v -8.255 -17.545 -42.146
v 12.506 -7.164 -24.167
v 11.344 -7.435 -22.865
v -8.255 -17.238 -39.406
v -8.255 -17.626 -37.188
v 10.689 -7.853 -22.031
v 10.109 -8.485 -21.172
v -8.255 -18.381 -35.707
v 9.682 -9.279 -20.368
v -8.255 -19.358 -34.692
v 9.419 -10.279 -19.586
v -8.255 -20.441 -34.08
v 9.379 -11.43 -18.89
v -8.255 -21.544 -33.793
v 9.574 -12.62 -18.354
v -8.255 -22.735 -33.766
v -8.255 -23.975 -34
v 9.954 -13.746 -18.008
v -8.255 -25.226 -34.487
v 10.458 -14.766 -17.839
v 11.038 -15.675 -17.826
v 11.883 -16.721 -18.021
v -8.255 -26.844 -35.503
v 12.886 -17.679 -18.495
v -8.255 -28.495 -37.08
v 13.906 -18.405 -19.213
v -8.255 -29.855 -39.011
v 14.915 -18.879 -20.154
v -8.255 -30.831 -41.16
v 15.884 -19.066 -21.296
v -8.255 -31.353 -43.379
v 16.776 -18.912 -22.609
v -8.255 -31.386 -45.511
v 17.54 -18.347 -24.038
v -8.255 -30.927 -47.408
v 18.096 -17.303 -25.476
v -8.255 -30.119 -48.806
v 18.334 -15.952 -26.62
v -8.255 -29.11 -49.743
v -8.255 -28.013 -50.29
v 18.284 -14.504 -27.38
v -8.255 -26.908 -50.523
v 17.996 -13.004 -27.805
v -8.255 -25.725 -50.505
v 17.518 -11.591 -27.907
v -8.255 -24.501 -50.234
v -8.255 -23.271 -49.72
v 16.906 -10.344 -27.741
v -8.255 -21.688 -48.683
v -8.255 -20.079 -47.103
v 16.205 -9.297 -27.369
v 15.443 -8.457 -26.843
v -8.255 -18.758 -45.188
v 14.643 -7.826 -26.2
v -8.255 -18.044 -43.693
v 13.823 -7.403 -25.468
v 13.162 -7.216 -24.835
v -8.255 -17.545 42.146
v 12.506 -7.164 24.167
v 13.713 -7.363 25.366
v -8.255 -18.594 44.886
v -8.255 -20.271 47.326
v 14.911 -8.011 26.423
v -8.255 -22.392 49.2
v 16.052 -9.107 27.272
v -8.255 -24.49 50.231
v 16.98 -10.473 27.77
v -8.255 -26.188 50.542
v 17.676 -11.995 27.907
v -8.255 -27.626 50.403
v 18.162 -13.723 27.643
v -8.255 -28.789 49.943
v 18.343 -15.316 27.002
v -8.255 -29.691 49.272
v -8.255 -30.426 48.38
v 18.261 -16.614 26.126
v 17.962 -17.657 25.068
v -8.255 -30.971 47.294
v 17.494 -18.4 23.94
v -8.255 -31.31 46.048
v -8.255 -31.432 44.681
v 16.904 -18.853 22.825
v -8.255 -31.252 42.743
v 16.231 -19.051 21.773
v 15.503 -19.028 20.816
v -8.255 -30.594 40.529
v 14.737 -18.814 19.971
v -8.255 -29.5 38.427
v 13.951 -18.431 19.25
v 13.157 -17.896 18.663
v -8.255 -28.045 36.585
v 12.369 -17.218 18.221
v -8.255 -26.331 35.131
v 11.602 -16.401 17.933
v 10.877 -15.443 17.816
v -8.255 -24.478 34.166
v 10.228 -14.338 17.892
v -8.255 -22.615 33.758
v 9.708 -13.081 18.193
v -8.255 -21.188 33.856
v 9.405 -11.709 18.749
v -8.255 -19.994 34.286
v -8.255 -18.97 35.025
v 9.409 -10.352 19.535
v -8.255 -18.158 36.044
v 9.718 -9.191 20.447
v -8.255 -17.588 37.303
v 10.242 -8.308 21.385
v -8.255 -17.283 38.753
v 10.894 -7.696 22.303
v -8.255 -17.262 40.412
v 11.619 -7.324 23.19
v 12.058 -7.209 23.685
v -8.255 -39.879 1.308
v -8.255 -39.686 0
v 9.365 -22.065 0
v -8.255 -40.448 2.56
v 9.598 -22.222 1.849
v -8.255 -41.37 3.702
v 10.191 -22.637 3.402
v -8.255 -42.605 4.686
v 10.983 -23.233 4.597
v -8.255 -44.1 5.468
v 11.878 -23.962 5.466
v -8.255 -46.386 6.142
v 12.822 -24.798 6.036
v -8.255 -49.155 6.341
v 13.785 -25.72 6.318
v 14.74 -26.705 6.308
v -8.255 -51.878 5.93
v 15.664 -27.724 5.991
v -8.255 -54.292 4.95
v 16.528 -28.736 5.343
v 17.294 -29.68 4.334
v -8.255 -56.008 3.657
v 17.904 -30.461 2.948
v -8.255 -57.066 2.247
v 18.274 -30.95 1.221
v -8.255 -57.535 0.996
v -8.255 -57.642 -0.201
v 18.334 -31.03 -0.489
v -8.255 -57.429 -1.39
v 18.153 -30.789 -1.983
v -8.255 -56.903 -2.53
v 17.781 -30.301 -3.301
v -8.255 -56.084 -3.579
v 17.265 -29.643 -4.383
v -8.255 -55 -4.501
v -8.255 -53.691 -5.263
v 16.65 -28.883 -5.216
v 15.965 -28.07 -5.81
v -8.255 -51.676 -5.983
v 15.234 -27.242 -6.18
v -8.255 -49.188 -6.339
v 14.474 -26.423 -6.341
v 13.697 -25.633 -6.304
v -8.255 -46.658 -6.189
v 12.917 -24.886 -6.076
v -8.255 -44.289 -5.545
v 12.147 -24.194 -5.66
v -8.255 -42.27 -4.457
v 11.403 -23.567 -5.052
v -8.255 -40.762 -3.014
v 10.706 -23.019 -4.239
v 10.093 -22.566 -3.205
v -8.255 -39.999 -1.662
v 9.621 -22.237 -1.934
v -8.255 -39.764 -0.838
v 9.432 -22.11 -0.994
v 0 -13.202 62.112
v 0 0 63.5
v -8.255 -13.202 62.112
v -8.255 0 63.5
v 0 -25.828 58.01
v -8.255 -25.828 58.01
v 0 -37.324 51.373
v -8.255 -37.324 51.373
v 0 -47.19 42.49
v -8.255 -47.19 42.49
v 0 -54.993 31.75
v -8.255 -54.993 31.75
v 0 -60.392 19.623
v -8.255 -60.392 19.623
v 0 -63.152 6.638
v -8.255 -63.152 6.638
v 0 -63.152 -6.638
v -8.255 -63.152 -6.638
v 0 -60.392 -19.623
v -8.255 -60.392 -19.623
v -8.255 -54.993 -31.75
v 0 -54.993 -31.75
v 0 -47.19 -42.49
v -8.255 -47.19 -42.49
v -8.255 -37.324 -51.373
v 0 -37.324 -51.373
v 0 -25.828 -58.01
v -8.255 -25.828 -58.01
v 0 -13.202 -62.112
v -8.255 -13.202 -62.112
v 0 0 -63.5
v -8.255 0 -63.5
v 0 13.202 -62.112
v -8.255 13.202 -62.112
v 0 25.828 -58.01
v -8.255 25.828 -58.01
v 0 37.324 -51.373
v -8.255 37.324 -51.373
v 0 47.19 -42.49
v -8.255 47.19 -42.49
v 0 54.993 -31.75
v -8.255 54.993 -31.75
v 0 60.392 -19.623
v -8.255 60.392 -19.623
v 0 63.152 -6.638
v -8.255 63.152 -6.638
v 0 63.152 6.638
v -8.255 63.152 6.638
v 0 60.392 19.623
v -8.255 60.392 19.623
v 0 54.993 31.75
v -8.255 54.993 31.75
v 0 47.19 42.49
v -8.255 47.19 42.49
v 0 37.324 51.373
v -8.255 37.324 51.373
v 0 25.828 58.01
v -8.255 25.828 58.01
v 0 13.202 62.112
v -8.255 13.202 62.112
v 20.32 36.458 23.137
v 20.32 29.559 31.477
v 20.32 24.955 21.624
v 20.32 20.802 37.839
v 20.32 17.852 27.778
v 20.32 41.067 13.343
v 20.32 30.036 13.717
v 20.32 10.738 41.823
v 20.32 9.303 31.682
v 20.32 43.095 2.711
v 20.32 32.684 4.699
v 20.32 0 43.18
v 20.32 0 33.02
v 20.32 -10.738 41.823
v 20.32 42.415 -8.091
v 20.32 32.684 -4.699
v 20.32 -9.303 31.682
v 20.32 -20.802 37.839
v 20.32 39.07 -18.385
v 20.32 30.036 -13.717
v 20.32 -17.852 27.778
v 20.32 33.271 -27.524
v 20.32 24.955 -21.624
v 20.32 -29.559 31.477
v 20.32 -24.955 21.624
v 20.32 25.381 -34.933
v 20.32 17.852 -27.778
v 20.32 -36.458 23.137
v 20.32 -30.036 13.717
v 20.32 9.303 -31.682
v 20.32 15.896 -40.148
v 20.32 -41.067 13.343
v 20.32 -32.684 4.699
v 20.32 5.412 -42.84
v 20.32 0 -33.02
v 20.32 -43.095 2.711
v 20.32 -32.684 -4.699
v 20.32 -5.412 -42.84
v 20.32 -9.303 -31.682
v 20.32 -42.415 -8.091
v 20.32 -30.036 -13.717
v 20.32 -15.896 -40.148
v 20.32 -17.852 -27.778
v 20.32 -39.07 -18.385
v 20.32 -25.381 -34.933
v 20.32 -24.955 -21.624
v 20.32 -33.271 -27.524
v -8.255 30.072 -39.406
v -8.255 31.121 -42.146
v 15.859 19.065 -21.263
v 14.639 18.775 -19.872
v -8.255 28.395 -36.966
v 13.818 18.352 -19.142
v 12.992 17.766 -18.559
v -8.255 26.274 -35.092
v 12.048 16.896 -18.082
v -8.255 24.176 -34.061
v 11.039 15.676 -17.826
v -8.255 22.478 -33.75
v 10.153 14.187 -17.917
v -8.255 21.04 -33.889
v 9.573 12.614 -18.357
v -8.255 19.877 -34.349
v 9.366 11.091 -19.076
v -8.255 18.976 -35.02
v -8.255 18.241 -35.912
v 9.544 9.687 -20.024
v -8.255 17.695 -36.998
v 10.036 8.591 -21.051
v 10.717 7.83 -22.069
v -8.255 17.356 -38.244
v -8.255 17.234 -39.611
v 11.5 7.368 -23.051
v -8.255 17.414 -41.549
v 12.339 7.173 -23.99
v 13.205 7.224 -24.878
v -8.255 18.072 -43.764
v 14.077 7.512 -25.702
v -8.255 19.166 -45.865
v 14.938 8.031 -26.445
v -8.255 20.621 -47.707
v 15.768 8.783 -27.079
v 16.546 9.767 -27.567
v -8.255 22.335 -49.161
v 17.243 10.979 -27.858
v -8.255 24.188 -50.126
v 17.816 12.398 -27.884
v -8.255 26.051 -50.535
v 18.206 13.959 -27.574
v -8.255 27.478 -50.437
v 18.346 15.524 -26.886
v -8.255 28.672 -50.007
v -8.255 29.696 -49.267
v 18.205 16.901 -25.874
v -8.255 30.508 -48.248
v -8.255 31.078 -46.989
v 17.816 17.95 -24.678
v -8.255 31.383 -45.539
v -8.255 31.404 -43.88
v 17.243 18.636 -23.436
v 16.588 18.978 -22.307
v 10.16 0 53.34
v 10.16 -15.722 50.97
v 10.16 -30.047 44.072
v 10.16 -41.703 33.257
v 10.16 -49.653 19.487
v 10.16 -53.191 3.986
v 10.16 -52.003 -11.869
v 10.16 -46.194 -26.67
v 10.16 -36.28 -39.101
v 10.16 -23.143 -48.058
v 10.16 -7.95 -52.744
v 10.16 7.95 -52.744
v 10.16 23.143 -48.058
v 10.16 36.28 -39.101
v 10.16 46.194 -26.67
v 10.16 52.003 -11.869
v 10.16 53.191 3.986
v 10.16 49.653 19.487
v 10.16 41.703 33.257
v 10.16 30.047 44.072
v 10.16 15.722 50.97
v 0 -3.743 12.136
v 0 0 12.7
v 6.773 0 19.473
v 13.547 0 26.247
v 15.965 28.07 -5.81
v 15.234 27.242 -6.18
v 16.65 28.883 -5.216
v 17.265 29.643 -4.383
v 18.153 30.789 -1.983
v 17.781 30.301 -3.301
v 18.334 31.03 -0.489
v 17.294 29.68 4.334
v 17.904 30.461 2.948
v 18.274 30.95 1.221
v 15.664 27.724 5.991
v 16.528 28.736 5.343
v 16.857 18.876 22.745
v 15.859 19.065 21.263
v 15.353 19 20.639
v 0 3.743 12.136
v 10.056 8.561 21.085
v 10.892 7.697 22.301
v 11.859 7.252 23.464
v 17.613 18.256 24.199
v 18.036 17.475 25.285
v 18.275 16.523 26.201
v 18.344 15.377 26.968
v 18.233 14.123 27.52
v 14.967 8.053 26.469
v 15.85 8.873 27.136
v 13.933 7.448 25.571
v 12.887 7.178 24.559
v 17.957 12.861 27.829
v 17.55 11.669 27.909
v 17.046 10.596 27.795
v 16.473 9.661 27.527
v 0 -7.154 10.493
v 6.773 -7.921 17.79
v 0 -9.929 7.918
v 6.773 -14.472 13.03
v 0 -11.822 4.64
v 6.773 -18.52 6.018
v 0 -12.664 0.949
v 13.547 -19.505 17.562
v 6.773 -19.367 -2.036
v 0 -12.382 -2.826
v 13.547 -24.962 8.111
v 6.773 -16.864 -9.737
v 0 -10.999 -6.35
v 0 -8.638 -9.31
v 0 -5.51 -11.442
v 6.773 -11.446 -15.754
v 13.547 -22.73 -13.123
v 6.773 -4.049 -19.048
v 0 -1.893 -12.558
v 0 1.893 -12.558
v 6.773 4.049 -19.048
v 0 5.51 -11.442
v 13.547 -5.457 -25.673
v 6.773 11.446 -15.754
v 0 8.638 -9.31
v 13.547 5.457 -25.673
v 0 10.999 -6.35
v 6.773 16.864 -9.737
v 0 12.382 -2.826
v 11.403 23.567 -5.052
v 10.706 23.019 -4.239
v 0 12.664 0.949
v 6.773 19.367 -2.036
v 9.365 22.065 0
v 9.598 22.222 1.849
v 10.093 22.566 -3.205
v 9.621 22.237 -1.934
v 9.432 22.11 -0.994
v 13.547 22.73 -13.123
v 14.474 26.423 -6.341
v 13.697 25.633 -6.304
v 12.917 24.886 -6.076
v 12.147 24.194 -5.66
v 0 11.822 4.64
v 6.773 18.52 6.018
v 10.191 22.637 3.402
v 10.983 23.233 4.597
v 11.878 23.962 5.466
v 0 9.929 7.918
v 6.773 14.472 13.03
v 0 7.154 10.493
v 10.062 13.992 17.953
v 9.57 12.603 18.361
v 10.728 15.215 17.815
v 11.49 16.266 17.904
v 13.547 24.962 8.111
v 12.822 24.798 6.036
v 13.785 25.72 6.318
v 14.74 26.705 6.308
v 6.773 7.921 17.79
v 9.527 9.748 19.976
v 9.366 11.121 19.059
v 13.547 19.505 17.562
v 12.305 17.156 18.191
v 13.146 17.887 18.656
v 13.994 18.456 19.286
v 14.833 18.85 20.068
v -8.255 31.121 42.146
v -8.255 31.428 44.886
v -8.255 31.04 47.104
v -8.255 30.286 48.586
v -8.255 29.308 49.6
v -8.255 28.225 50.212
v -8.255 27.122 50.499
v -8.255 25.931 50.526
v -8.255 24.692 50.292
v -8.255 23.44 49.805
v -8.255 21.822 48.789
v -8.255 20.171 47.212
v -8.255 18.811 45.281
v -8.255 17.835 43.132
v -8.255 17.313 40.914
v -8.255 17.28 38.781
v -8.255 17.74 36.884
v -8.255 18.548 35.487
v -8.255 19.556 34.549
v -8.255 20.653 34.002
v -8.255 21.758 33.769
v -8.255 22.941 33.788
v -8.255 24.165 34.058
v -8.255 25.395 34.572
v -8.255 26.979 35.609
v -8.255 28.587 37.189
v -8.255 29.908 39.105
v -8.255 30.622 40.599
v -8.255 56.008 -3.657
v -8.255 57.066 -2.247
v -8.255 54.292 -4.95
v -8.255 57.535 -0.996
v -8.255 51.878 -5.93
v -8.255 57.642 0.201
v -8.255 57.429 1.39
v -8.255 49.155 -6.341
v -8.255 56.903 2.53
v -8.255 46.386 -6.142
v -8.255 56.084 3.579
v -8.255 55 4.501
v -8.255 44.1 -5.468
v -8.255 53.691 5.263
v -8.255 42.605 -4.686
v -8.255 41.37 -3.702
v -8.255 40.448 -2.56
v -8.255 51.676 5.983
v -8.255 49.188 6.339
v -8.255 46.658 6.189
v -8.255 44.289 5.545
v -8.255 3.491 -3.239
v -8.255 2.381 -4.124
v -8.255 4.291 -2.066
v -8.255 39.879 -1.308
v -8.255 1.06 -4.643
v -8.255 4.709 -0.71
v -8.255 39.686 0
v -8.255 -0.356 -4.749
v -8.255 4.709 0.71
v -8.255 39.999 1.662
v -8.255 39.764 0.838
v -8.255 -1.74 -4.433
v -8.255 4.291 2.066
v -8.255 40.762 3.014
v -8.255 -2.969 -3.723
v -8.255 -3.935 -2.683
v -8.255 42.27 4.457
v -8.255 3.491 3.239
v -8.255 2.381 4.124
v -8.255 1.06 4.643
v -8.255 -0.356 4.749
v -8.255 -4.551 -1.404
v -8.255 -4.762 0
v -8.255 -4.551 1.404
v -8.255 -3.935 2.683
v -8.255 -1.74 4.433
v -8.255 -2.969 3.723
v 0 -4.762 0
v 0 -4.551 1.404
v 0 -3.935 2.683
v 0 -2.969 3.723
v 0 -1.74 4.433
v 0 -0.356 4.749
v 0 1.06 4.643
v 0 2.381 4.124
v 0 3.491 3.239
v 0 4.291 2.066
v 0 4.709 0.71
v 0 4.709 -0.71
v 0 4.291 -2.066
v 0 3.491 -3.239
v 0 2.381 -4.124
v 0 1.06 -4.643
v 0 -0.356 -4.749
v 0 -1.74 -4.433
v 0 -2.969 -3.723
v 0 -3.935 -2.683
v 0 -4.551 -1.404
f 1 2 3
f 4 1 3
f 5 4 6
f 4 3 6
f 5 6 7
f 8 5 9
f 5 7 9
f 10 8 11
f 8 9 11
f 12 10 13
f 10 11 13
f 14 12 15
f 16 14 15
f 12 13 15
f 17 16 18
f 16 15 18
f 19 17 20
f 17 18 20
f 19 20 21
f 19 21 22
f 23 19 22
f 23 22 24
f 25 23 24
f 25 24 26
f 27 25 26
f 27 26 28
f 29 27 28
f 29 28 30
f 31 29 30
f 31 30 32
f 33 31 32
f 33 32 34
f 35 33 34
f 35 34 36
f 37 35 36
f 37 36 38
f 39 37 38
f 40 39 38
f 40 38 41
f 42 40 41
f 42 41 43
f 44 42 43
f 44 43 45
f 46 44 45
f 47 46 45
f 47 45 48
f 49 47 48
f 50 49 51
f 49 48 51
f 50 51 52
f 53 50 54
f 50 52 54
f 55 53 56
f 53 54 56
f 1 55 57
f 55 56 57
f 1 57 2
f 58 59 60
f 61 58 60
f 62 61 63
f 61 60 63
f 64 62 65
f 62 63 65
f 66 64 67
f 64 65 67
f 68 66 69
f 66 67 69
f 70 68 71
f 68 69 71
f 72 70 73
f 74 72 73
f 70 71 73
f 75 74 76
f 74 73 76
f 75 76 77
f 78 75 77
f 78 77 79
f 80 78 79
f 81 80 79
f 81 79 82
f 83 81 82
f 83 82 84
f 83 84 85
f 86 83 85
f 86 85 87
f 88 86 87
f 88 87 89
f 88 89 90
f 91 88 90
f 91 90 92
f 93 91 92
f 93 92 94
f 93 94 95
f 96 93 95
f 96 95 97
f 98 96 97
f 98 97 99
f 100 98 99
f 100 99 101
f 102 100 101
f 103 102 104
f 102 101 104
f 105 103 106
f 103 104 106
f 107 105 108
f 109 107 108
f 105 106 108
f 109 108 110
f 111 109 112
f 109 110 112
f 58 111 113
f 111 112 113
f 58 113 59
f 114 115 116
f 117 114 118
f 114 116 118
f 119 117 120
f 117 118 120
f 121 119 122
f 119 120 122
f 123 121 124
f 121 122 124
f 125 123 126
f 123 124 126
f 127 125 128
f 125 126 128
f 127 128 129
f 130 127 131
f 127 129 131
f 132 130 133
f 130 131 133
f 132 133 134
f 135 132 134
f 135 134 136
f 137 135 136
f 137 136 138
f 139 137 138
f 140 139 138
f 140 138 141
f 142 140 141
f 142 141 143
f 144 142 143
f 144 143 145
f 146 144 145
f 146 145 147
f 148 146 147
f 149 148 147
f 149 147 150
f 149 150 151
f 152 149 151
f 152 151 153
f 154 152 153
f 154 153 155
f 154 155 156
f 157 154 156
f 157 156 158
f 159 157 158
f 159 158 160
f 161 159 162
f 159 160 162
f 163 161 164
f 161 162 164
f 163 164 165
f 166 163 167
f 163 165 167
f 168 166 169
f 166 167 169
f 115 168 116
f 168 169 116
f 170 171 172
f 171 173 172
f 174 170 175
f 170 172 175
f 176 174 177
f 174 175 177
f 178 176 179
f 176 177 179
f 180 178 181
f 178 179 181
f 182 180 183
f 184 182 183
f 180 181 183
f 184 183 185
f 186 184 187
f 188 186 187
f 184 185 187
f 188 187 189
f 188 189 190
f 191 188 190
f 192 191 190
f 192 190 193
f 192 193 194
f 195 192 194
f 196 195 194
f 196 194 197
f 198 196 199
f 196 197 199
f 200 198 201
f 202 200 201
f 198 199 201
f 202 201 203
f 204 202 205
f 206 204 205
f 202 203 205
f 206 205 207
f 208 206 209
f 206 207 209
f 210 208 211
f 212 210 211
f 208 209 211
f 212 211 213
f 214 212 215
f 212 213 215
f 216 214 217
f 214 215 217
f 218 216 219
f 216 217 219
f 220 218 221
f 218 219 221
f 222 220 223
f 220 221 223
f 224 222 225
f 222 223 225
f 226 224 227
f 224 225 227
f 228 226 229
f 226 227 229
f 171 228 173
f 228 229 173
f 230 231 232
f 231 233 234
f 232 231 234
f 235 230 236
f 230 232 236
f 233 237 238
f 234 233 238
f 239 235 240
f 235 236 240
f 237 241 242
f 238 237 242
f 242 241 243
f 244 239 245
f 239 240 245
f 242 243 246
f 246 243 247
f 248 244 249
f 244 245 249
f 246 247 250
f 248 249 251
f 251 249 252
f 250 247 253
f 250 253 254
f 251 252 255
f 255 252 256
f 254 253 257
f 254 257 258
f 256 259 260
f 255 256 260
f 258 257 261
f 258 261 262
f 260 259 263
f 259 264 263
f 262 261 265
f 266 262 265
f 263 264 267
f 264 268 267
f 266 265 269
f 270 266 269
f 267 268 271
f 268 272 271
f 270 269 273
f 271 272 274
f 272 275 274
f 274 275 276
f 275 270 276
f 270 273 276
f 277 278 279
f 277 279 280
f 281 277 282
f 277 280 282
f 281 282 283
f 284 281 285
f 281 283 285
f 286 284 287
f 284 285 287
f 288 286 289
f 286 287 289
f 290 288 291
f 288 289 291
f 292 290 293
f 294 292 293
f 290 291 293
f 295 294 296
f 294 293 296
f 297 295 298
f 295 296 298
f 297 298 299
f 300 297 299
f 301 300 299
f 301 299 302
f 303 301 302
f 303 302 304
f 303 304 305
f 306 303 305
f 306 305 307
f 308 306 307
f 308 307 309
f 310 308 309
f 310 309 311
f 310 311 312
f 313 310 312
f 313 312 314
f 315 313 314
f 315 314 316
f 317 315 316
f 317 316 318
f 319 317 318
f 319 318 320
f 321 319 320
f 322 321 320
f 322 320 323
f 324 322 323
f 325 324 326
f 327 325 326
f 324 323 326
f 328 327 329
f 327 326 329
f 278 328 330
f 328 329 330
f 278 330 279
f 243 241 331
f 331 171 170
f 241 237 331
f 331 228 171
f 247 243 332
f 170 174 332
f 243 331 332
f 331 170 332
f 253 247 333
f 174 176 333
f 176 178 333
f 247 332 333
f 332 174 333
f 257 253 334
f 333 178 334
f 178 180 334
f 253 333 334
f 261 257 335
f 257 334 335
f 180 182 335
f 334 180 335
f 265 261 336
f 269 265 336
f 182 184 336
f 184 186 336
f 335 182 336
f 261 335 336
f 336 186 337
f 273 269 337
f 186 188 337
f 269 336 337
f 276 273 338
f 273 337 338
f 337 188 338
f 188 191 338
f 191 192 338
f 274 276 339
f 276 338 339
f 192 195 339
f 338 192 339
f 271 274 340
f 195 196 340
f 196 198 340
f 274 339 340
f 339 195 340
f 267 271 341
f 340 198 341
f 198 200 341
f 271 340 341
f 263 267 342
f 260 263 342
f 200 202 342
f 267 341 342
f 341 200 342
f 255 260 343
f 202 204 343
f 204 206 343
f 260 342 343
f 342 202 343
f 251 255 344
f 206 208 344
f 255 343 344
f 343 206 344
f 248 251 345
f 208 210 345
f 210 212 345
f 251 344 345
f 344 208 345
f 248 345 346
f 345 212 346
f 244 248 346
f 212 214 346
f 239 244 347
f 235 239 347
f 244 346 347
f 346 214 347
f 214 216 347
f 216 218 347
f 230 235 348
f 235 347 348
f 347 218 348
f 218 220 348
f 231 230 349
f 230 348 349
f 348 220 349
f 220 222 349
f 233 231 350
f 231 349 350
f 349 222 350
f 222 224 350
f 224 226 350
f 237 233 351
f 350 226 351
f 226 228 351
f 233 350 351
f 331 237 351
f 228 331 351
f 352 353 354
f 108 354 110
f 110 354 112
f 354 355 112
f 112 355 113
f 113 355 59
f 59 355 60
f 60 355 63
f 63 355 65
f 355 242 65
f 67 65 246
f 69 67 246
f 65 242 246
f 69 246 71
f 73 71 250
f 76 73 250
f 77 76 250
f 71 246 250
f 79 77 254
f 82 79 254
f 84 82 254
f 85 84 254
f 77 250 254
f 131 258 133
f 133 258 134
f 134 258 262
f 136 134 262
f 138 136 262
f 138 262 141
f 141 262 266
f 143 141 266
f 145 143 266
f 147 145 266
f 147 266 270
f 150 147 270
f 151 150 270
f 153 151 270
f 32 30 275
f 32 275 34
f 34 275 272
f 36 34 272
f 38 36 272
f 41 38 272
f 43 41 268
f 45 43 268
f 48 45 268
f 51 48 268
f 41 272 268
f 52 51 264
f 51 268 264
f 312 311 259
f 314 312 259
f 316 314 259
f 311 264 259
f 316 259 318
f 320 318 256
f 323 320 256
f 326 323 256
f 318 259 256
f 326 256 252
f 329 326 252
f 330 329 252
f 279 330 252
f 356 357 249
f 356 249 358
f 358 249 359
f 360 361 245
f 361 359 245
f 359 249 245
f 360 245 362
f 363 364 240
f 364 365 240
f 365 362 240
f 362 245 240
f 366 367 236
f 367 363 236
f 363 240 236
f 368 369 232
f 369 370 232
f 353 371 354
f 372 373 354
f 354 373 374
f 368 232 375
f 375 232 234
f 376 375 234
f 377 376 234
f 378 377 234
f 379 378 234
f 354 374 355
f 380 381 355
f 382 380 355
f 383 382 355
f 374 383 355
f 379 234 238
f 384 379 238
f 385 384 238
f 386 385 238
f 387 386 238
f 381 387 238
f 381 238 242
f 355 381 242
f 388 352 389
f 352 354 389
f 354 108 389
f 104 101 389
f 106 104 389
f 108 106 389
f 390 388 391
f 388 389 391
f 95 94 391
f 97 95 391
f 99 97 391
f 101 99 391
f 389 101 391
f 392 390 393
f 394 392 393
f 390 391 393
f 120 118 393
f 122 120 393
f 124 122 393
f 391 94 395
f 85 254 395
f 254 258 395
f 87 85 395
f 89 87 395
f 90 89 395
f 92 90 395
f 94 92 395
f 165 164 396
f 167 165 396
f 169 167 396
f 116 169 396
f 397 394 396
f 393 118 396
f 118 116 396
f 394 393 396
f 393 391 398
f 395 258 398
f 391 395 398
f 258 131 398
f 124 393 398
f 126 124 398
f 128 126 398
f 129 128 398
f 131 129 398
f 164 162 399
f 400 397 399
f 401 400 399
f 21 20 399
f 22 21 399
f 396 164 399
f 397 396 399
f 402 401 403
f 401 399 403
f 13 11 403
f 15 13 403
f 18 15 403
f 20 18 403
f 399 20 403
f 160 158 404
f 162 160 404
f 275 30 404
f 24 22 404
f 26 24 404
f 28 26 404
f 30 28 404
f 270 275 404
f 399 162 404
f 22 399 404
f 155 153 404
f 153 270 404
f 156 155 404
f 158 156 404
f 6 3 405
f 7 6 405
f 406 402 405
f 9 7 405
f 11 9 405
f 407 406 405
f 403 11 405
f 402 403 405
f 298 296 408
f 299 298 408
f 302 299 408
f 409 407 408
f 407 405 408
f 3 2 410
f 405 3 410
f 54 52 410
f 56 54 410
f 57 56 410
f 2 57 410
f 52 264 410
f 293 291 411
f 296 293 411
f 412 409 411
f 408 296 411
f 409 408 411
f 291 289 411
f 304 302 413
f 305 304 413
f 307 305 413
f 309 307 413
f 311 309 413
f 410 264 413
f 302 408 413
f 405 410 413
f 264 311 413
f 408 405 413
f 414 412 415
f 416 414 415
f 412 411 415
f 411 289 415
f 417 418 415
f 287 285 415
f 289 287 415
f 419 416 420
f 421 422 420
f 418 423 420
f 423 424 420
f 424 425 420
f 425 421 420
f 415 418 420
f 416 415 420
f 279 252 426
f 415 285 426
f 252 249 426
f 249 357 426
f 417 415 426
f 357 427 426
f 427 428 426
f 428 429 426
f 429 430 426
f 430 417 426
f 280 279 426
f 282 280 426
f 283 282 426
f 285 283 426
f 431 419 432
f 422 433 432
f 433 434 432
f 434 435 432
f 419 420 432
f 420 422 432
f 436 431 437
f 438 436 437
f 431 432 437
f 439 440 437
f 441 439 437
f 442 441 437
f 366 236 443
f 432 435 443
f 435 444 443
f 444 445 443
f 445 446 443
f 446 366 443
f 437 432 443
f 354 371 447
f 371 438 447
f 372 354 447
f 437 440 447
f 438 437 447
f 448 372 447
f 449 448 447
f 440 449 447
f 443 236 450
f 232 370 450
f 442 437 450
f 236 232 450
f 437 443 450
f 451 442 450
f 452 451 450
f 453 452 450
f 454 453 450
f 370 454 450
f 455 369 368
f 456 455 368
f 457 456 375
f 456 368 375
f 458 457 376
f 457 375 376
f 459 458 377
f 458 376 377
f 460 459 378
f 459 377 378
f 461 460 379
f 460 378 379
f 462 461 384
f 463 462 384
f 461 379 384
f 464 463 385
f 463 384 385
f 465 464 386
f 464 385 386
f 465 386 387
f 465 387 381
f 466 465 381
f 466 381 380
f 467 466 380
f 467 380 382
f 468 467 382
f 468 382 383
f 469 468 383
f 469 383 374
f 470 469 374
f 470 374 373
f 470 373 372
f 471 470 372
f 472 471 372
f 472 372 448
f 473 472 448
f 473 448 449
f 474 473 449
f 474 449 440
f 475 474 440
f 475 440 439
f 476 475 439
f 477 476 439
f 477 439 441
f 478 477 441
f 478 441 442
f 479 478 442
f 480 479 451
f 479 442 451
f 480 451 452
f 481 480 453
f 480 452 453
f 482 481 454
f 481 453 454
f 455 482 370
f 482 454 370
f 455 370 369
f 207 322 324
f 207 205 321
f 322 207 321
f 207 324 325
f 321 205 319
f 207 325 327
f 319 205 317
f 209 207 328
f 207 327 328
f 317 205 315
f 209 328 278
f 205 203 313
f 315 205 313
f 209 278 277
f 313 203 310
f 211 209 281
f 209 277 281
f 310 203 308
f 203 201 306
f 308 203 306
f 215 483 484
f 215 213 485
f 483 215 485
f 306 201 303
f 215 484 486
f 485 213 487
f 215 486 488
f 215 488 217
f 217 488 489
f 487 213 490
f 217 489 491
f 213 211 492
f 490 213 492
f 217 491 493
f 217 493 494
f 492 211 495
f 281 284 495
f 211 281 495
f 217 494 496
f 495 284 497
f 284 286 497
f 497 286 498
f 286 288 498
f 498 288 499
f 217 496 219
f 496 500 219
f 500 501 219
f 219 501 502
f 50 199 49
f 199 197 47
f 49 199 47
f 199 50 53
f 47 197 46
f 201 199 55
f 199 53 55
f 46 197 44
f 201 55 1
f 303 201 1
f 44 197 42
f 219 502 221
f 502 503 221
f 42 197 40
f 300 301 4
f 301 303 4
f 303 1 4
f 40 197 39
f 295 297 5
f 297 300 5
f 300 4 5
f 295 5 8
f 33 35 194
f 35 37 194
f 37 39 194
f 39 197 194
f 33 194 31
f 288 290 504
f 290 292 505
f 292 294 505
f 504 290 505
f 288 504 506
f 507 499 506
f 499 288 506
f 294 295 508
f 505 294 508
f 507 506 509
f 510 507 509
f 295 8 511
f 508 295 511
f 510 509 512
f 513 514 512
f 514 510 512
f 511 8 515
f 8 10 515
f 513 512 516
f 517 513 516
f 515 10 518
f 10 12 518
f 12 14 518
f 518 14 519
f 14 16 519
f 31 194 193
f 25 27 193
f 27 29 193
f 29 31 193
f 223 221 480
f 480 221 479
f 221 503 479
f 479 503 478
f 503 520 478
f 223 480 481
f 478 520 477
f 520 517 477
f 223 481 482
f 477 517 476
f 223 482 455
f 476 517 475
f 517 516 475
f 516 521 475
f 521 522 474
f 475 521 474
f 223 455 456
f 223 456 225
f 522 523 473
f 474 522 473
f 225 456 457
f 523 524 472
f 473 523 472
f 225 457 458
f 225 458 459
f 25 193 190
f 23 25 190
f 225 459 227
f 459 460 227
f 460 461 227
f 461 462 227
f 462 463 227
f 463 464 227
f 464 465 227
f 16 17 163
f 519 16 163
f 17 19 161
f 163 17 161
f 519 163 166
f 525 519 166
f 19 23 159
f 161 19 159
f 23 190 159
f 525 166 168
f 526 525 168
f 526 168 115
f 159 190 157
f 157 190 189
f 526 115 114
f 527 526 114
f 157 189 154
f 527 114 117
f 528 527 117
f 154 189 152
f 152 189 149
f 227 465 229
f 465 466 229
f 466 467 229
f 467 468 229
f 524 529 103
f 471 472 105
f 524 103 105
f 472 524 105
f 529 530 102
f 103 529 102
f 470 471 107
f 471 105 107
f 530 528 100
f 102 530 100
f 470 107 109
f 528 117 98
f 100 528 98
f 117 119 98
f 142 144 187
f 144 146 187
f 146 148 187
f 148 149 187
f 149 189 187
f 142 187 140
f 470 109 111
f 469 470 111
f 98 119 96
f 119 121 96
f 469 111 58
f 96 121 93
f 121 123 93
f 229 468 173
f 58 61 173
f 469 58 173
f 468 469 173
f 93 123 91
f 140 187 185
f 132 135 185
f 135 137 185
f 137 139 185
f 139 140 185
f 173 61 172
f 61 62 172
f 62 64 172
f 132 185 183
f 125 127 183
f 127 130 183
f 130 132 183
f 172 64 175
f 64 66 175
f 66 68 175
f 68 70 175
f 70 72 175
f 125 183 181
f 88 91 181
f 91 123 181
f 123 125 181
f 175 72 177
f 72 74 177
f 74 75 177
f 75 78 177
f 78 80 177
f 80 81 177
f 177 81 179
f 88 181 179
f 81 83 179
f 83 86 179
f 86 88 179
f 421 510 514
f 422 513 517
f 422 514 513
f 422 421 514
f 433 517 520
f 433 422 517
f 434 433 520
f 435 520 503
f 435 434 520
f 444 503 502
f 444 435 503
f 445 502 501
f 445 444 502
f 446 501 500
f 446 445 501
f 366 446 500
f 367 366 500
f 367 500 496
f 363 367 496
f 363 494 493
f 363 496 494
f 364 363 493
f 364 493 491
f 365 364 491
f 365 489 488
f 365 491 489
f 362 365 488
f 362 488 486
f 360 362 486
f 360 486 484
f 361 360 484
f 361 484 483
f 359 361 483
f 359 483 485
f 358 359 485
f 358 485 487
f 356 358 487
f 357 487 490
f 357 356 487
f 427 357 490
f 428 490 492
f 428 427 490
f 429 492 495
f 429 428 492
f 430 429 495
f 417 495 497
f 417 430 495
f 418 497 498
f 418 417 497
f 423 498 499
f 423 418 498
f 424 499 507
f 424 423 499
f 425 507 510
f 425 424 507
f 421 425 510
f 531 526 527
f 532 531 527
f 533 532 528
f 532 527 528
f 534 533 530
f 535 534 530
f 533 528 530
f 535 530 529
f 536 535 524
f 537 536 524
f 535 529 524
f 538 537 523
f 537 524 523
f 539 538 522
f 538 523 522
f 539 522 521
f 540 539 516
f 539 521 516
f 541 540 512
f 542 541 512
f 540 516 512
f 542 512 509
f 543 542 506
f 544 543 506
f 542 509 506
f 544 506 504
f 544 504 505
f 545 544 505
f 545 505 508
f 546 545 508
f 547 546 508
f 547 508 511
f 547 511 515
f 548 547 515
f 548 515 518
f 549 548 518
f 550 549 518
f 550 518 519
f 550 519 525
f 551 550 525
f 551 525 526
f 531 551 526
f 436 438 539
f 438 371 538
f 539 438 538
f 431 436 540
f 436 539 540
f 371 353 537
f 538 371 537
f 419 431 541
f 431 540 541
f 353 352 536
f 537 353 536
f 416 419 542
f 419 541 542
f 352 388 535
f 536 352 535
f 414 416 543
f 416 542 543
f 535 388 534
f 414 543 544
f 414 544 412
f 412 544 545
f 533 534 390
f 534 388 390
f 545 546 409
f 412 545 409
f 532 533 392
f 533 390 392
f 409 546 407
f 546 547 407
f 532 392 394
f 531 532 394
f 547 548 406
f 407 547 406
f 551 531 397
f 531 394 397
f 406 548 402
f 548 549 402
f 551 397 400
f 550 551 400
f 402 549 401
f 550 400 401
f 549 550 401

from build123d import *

# Parameters (mm, degrees)
F10_R     = 6.35
F15_DEPTH = 67.174456
F11_R     = 6.35
F16_DEPTH = 67.174457
F14_R     = 6.35
F17_DEPTH = 50.739447
F13_R     = 6.35
F18_DEPTH = 50.739447
F9_R      = 6.35
F19_DEPTH = 67.174457
F12_R     = 6.35
F20_DEPTH = 67.174457
F21_D     = 9.525


with BuildPart() as f1:
    # F0 (on Front) → F1 (revolve)
    with BuildSketch(Plane.XZ):
        Polygon((-8.255, 0), (0, 0), (0, 12.7), (20.32, 33.02), (20.32, 43.18), (0, 63.5), (-8.255, 63.5), align=None)
    revolve(axis=Axis((-4.1275, 0, 0), (1, 0, 0)))

    # F10 (on face) → F15 (cut, through all)
    with BuildSketch(Plane(origin=(0, 0, 0), x_dir=(-0.267261, 0.935414, 0.231455), z_dir=(0.707107, 0.353553, -0.612372))):
        with Locations((-10.800335, 26.455309)):
            Circle(F10_R)
    extrude(amount=-F15_DEPTH, mode=Mode.SUBTRACT)

    # F11 (on face) → F16 (cut, through all)
    with BuildSketch(Plane(origin=(0, 0, 0), x_dir=(0.267261, 0.935414, -0.231455), z_dir=(0.707107, -0.353553, -0.612372))):
        with Locations((10.800335, 26.455309)):
            Circle(F11_R)
    extrude(amount=-F16_DEPTH, mode=Mode.SUBTRACT)

    # F14 (on face) → F17 (cut, through all)
    with BuildSketch(Plane(origin=(0, 0, 0), x_dir=(-0.707107, 0.707107, 0), z_dir=(0.707107, 0.707107, 0))):
        with Locations((-28.575, 0)):
            Circle(F14_R)
    extrude(amount=-F17_DEPTH, mode=Mode.SUBTRACT)

    # F13 (on face) → F18 (cut, through all)
    with BuildSketch(Plane(origin=(0, 0, 0), x_dir=(-0.707107, -0.707107, 0), z_dir=(-0.707107, 0.707107, 0))):
        with Locations((-28.575, 0)):
            Circle(F13_R)
    extrude(amount=F18_DEPTH, mode=Mode.SUBTRACT)

    # F9 (on face) → F19 (cut, through all)
    with BuildSketch(Plane(origin=(0, 0, 0), x_dir=(0.267261, 0.935414, 0.231455), z_dir=(0.707107, -0.353553, 0.612372))):
        with Locations((10.800335, -26.455309)):
            Circle(F9_R)
    extrude(amount=-F19_DEPTH, mode=Mode.SUBTRACT)

    # F12 (on face) → F20 (cut, through all)
    with BuildSketch(Plane(origin=(0, 0, 0), x_dir=(-0.267261, 0.935414, -0.231455), z_dir=(0.707107, 0.353553, 0.612372))):
        with Locations((-10.800335, -26.455309)):
            Circle(F12_R)
    extrude(amount=-F20_DEPTH, mode=Mode.SUBTRACT)

    # F21 (through all)
    with Locations(Plane.YZ):
        with Locations((0, 0)):
            Hole(F21_D / 2)


solid = f1.part
